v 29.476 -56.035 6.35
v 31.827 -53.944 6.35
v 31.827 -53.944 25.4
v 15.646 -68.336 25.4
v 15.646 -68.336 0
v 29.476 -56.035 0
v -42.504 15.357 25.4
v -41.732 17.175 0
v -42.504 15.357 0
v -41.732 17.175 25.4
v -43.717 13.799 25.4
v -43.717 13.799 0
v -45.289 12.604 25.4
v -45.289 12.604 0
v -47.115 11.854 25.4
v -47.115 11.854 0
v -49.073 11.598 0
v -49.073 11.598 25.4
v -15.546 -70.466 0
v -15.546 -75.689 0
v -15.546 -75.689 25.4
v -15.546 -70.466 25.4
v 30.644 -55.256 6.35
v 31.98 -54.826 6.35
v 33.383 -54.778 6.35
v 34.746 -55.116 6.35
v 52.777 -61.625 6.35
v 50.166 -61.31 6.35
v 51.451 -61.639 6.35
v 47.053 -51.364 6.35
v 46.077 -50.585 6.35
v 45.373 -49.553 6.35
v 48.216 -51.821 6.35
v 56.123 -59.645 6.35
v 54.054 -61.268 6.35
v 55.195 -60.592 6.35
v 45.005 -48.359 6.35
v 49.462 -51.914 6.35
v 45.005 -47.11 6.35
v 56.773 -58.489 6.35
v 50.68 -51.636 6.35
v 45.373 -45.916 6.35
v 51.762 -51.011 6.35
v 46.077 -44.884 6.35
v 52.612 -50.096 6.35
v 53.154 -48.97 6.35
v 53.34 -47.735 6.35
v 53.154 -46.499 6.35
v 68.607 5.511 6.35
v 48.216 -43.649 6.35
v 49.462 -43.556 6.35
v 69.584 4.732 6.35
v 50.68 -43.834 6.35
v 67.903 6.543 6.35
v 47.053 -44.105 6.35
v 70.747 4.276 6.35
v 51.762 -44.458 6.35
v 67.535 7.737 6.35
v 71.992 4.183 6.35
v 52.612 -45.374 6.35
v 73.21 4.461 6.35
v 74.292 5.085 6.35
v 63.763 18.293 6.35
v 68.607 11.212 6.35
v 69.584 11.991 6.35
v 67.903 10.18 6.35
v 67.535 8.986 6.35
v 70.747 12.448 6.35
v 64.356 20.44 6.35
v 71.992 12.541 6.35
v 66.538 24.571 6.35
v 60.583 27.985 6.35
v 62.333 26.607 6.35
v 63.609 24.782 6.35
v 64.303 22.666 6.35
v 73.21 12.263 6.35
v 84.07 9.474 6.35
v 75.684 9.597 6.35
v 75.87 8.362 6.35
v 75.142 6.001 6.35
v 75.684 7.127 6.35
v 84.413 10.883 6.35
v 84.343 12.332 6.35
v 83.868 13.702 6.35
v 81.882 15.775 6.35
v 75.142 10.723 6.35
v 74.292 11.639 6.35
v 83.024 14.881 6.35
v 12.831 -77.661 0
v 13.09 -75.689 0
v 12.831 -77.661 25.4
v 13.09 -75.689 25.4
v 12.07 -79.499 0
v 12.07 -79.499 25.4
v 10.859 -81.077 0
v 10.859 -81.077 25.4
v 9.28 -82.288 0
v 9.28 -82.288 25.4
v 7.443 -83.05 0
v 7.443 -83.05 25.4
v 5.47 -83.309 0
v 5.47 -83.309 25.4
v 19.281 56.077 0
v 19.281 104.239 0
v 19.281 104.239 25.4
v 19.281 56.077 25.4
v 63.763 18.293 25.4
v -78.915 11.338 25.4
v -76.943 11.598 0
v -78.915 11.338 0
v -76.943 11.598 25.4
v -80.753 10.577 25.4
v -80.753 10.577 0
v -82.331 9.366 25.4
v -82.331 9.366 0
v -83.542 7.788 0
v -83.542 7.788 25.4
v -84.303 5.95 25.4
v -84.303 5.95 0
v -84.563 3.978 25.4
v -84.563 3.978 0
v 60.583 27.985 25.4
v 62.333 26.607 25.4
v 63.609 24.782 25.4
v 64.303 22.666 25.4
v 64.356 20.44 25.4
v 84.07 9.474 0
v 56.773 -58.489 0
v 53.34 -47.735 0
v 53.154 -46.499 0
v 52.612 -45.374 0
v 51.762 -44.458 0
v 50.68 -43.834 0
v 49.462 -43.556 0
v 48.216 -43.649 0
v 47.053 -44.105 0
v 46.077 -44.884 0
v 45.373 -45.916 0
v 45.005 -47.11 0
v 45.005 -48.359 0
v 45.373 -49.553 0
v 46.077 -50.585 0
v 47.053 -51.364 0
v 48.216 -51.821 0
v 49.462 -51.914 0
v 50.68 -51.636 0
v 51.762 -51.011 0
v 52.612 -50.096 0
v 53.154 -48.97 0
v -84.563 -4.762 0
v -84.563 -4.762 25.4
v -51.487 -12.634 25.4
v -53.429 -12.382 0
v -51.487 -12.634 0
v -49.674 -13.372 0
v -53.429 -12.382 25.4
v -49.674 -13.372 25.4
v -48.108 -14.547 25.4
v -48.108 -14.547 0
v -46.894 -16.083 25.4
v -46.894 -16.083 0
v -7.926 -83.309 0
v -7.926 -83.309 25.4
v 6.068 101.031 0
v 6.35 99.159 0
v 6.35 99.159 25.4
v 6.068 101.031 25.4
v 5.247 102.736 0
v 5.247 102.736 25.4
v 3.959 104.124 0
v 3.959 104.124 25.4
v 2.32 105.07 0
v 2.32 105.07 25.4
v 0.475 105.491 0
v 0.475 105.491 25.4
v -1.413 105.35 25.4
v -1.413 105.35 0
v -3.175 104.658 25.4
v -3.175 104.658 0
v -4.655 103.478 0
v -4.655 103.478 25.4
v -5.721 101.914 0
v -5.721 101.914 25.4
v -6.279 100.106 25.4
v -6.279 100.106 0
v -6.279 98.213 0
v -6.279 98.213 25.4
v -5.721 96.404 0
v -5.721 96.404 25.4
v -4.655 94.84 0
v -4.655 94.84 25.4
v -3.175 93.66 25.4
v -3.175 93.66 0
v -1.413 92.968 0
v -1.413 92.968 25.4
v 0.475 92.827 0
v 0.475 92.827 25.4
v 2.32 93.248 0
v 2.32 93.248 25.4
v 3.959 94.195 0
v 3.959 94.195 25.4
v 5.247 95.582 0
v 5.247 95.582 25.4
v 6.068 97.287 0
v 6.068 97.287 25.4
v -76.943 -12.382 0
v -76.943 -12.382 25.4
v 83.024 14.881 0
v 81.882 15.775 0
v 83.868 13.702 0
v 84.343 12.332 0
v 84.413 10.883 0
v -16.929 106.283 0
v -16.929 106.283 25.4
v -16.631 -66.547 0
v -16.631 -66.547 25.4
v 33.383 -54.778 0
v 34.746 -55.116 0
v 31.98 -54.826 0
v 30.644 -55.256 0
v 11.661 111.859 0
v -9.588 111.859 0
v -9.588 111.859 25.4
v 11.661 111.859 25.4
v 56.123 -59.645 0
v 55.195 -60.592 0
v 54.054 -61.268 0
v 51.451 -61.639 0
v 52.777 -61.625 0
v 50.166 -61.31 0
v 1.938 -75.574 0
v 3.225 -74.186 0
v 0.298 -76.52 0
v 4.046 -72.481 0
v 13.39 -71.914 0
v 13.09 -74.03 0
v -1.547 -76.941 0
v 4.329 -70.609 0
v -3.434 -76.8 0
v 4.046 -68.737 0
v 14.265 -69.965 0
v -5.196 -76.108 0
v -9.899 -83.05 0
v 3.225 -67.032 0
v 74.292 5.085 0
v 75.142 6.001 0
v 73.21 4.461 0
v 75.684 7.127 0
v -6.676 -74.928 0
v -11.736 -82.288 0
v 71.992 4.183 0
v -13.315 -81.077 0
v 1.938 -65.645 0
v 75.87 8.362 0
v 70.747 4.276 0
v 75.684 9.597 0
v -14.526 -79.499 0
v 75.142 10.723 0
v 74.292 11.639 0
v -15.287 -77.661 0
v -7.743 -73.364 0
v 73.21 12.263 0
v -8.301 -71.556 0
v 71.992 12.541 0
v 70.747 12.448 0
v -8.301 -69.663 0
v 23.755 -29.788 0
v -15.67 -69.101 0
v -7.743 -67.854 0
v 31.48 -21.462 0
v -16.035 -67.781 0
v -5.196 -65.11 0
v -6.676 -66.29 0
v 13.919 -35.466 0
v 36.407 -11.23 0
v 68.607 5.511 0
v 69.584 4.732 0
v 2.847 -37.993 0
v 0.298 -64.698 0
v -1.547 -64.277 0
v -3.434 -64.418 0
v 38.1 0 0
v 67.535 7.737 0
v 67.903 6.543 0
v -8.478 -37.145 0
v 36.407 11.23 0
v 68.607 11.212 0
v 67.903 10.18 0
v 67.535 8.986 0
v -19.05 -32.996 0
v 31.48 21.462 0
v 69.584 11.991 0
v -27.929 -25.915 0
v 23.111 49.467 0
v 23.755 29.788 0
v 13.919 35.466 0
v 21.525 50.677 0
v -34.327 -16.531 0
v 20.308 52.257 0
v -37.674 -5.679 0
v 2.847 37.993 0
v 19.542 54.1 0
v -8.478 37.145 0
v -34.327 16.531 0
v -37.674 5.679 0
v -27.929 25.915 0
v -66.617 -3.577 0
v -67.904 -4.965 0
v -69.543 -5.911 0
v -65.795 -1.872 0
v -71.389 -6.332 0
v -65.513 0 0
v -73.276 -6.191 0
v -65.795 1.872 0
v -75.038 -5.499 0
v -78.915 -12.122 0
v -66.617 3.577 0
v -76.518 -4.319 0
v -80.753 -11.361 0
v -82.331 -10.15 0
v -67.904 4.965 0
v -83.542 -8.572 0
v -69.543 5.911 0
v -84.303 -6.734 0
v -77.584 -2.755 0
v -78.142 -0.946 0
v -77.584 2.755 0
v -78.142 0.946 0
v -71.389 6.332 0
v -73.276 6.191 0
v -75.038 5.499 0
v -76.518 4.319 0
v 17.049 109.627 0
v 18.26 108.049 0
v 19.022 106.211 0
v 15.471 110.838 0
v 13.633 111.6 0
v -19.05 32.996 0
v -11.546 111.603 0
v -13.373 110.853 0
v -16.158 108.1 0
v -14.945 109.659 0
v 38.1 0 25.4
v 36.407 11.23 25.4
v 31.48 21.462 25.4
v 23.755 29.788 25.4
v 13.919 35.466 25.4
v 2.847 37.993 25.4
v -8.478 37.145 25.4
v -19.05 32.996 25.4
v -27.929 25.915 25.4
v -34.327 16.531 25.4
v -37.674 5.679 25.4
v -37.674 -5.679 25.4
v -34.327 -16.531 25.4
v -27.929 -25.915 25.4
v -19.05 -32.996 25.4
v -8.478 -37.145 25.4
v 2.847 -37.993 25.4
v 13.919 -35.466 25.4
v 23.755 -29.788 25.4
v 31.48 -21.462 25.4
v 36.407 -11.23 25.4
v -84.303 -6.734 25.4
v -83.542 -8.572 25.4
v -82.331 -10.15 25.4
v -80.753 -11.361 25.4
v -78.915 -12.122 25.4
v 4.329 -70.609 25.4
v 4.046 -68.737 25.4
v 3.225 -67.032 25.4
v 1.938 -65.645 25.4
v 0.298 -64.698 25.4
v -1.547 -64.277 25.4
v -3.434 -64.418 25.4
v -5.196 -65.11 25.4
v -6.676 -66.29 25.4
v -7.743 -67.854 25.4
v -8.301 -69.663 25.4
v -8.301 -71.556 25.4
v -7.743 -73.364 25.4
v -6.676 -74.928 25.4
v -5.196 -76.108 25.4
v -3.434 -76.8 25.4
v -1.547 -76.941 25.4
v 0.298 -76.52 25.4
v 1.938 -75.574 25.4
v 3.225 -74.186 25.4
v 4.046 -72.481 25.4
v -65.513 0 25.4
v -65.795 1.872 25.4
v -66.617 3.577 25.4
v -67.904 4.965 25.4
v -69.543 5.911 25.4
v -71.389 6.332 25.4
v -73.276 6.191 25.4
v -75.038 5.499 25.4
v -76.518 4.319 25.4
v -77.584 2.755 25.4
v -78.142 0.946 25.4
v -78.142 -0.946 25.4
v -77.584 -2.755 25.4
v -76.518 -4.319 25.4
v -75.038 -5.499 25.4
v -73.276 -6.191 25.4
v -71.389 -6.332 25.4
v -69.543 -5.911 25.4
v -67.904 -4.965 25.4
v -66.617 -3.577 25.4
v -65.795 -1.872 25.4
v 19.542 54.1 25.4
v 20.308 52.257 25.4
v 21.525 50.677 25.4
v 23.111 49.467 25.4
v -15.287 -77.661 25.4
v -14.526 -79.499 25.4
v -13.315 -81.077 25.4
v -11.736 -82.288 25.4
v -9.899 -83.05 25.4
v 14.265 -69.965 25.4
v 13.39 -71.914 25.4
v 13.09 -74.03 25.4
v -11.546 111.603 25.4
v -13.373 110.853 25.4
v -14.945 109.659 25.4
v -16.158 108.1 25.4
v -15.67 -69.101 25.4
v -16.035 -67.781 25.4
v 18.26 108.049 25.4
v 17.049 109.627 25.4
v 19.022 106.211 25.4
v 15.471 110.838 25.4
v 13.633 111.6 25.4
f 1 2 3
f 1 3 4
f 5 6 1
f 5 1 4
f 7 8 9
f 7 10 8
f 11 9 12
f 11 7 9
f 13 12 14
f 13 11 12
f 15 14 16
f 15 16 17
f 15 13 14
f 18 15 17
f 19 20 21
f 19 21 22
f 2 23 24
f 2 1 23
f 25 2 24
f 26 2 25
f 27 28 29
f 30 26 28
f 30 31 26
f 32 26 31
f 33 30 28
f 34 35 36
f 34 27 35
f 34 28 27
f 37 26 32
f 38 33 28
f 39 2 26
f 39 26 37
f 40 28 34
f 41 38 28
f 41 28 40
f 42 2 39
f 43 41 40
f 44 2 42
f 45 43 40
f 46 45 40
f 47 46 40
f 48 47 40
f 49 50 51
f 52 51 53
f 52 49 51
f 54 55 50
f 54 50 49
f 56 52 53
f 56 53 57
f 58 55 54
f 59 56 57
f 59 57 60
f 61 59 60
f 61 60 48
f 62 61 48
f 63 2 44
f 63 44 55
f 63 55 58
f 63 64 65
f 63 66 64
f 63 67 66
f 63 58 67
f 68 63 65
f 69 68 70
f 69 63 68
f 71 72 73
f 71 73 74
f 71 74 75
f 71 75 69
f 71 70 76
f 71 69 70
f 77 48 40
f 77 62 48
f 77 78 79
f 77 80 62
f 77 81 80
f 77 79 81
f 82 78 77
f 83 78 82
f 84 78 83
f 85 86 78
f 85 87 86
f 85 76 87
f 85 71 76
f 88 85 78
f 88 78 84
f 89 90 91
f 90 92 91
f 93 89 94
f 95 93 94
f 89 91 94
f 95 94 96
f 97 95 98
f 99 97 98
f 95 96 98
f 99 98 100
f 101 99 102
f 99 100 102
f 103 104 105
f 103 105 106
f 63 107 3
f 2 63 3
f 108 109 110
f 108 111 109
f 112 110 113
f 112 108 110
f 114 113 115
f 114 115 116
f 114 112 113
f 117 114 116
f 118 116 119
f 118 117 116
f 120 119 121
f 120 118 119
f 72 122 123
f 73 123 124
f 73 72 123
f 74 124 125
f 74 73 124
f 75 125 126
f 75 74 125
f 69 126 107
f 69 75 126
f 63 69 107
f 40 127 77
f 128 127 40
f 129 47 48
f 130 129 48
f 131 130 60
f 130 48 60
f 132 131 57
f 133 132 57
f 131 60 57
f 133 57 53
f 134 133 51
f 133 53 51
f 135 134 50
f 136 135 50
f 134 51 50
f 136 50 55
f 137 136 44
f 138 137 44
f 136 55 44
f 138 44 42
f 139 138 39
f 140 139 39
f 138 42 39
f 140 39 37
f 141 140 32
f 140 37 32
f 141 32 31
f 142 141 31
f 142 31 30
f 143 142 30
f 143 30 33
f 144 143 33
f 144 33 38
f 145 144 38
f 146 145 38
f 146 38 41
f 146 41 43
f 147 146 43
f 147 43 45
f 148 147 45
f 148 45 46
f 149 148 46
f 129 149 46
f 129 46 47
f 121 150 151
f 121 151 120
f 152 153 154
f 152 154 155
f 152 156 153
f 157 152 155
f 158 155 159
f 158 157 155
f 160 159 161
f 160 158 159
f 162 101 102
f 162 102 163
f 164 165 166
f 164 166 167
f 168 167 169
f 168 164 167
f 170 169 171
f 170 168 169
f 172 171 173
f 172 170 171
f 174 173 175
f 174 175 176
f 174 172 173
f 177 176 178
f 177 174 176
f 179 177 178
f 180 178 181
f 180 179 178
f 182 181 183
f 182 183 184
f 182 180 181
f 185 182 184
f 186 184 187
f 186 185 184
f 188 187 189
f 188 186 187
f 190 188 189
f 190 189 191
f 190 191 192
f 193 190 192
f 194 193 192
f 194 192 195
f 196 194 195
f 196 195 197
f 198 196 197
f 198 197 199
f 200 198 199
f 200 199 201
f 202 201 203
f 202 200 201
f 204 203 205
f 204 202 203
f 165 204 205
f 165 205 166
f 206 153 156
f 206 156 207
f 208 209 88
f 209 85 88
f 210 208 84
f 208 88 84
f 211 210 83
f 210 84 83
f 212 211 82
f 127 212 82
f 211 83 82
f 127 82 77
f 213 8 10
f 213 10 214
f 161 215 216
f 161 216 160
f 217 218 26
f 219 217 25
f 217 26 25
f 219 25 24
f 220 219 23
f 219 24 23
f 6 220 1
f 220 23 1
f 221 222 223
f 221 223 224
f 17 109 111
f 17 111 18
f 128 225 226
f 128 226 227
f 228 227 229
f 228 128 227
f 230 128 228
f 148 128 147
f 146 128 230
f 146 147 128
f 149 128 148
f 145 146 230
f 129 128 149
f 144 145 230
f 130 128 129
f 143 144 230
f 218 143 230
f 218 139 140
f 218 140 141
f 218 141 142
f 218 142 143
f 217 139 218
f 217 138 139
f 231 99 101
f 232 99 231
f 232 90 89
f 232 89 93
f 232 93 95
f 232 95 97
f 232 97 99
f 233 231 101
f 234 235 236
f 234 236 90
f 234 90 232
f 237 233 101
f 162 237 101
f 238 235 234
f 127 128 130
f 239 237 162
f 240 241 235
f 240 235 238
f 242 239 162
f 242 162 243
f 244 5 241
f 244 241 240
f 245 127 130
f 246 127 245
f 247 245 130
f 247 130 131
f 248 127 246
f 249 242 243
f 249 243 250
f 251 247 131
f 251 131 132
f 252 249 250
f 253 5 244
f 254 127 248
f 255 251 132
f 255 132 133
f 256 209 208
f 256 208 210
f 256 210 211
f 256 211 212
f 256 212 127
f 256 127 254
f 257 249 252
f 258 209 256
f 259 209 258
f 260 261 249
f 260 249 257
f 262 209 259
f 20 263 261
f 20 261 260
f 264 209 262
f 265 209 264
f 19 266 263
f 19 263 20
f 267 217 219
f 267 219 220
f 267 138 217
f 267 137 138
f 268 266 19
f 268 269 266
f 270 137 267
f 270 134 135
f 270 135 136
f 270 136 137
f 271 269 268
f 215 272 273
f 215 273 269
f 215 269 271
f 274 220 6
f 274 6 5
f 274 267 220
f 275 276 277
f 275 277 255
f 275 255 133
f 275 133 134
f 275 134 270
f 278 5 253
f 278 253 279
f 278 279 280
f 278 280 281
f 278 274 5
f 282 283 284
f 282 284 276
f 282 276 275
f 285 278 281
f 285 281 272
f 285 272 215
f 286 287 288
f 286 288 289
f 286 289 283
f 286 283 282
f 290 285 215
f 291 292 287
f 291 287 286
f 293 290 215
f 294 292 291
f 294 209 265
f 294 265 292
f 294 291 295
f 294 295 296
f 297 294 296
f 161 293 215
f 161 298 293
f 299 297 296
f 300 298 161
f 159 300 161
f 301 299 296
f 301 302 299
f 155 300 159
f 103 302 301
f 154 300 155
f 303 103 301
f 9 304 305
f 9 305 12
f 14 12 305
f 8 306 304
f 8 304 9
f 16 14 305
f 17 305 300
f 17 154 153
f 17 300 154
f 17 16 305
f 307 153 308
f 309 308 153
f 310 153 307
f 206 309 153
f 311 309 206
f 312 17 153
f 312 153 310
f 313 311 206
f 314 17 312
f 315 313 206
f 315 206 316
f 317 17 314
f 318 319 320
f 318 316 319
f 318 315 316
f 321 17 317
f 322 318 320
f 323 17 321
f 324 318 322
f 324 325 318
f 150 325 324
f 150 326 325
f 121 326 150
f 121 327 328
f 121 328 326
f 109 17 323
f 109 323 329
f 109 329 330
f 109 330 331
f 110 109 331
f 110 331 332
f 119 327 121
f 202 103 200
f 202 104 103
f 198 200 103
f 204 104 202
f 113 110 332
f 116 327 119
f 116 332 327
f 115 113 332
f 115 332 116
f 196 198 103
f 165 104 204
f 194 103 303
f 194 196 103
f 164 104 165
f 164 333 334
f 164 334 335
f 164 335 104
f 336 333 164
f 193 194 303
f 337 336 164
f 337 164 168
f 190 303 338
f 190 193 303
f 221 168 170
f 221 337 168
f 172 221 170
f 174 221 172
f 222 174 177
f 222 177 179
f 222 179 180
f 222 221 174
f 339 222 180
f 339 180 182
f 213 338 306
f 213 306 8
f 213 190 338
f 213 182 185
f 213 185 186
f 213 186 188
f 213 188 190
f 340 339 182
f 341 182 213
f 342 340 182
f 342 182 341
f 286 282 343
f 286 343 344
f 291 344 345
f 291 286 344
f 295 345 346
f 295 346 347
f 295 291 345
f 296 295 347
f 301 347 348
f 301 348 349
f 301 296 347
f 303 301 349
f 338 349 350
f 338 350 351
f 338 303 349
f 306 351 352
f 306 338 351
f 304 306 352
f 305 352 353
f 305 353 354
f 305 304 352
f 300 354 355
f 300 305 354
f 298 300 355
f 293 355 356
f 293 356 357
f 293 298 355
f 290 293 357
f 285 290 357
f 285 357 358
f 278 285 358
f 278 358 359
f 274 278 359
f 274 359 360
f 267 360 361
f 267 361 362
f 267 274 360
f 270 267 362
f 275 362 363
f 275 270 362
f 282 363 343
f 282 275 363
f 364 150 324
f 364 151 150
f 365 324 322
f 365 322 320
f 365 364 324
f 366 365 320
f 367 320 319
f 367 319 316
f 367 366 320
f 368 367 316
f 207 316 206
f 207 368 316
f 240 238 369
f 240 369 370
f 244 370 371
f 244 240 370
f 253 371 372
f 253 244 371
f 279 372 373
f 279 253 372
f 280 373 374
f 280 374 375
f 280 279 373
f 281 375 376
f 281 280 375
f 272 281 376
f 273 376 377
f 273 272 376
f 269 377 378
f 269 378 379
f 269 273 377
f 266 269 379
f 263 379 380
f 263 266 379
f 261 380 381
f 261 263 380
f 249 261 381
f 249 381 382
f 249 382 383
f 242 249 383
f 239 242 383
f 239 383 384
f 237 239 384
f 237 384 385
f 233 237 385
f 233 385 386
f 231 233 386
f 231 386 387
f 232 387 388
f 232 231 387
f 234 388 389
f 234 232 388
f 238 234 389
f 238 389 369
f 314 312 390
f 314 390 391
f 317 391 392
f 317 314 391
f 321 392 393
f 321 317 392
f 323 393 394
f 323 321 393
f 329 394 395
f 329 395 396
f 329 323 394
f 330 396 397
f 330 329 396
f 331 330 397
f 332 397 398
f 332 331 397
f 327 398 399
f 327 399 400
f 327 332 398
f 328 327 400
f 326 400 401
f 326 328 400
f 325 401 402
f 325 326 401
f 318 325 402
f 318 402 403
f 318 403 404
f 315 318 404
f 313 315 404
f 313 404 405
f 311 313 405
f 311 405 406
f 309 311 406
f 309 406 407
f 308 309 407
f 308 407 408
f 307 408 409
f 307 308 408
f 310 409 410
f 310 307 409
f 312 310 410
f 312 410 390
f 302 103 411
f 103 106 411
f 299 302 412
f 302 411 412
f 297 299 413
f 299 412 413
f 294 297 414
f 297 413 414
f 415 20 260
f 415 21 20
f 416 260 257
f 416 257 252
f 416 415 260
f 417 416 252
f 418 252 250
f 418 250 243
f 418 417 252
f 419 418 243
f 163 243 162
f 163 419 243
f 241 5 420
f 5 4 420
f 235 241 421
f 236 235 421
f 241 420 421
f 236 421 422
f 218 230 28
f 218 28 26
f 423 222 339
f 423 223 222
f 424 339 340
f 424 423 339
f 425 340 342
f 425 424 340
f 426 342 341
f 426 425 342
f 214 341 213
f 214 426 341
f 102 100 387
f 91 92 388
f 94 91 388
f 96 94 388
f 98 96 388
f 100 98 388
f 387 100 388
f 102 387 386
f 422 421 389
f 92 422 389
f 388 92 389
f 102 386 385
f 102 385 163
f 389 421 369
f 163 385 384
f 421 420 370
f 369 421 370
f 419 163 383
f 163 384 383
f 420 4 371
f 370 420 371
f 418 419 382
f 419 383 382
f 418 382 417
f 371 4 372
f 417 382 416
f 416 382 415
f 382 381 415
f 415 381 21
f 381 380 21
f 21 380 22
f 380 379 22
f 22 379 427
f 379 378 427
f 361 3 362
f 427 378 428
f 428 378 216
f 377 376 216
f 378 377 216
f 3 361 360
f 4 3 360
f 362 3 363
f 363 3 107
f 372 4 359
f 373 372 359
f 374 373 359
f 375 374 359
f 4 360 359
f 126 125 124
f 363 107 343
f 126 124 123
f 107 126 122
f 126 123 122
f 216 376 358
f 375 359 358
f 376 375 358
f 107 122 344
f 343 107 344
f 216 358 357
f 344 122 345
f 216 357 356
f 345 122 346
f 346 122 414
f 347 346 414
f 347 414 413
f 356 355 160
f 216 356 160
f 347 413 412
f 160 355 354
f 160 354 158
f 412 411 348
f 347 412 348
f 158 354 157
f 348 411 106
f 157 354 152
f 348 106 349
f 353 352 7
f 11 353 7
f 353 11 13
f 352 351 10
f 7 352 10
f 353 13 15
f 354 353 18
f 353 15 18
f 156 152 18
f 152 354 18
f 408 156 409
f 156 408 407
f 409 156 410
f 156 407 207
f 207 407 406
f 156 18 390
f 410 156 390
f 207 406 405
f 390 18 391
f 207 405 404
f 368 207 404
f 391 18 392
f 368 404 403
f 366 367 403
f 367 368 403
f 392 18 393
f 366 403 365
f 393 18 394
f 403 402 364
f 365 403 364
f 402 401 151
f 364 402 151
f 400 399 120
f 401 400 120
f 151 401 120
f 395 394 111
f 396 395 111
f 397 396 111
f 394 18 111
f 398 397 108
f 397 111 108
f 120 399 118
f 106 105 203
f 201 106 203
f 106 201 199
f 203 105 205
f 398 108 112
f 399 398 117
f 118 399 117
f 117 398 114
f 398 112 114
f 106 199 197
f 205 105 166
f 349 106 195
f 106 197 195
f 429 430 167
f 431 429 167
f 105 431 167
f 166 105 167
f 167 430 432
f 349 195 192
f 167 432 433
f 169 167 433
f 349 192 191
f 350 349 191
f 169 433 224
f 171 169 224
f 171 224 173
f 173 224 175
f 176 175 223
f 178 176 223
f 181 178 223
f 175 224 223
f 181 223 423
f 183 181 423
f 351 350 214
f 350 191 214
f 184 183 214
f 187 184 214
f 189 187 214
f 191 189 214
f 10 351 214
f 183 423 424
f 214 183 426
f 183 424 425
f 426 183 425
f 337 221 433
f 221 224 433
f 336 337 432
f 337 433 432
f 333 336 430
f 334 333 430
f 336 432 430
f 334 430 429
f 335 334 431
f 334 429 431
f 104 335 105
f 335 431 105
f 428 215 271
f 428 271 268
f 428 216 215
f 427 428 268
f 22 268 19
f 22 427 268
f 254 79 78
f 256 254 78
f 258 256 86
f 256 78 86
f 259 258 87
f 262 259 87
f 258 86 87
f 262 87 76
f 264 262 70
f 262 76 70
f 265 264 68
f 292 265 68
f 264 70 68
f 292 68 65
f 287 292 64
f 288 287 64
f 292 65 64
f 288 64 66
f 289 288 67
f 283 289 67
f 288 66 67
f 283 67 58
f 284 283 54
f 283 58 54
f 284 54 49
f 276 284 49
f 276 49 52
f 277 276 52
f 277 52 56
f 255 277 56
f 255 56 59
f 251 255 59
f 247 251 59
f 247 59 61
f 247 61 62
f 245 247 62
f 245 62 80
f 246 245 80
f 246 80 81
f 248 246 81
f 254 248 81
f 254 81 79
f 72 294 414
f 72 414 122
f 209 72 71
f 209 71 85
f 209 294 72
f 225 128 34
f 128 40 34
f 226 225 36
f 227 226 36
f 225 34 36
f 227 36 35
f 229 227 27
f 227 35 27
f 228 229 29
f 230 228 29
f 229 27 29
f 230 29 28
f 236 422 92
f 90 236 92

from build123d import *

# Parameters (mm, degrees)
SKETCH1_R           = 38.1
SKETCH1_R_2         = 6.35
BOSS_EXTRUDE1_DEPTH = 25.4
CUT_EXTRUDE1_DEPTH  = 19.05
SKETCH3_R           = 4.191
CUT_EXTRUDE2_DEPTH  = 144.195909909
FILLET1_R           = 7.62
FILLET2_R           = 5.08


with BuildPart() as part:
    # Sketch1 → Boss-Extrude1 (new body)
    with BuildSketch(Plane.XY):
        Polygon((-15.376904817, 111.859177573), (19.281255226, 111.859177573), (19.281255226, 51.662487547), (85.717168685, 13.57632424), (54.880053148, -63.203130515), (31.826573213, -53.944106385), (13.090387594, -70.609161185), (13.090387594, -83.309161185), (-15.546461726, -83.309161185), (-15.546461726, -68.356164498), (-49.113541671, -12.382140744), (-84.5631354, -12.382140744), (-84.5631354, 11.598068918), (-43.284636092, 11.598068918), align=None)
        Circle(SKETCH1_R, mode=Mode.SUBTRACT)
        with Locations((0, 99.159177573)):
            Circle(SKETCH1_R_2, mode=Mode.SUBTRACT)
        with Locations((-2.02148369, -70.609161185)):
            Circle(SKETCH1_R_2, mode=Mode.SUBTRACT)
        with Locations((-71.8631354, 0)):
            Circle(SKETCH1_R_2, mode=Mode.SUBTRACT)
    extrude(amount=BOSS_EXTRUDE1_DEPTH)

    # Sketch2 → Cut-Extrude1 (cut)
    with BuildSketch(Plane.XY.offset(25.4)):
        Polygon((445.884060036, -192.898973947), (85.717168685, 13.57632424), (66.538177491, 24.571193621), (31.826573213, -53.944106385), (-136.039422118, -433.645628635), (181.37430947, -1200.885797388), (763.297791624, -960.1391427), align=None)
    extrude(amount=-CUT_EXTRUDE1_DEPTH, mode=Mode.SUBTRACT)

    # Sketch3 → Cut-Extrude2 (cut, through all)
    with BuildSketch(Plane.XY.offset(25.4)):
        with Locations((71.679164996, 8.361848351)):
            Circle(SKETCH3_R)
        with Locations((49.148937242, -47.734792738)):
            Circle(SKETCH3_R)
    extrude(amount=-CUT_EXTRUDE2_DEPTH, mode=Mode.SUBTRACT)

    # Fillet1
    fillet1_edges = [part.edges().sort_by_distance(p)[0] for p in [
        (13.090387594, -70.609161185, 12.7),
        (13.090387594, -83.309161185, 12.7),
        (-15.546461726, -83.309161185, 12.7),
        (-15.546461726, -68.356164498, 12.7),
        (-49.113541671, -12.382140744, 12.7),
        (-84.5631354, -12.382140744, 12.7),
        (-84.5631354, 11.598068918, 12.7),
        (-43.284636092, 11.598068918, 12.7),
        (-15.376904817, 111.859177573, 12.7),
        (19.281255226, 111.859177573, 12.7),
        (19.281255226, 51.662487547, 12.7),
        (66.538177491, 24.571193621, 15.875),
    ]]
    fillet(fillet1_edges, radius=FILLET1_R)

    # Fillet2
    fillet2_edges = [part.edges().sort_by_distance(p)[0] for p in [
        (85.717168685, 13.57632424, 3.175),
        (54.880053148, -63.203130515, 3.175),
        (31.826573213, -53.944106385, 3.175),
    ]]
    fillet(fillet2_edges, radius=FILLET2_R)


solid = part.part
